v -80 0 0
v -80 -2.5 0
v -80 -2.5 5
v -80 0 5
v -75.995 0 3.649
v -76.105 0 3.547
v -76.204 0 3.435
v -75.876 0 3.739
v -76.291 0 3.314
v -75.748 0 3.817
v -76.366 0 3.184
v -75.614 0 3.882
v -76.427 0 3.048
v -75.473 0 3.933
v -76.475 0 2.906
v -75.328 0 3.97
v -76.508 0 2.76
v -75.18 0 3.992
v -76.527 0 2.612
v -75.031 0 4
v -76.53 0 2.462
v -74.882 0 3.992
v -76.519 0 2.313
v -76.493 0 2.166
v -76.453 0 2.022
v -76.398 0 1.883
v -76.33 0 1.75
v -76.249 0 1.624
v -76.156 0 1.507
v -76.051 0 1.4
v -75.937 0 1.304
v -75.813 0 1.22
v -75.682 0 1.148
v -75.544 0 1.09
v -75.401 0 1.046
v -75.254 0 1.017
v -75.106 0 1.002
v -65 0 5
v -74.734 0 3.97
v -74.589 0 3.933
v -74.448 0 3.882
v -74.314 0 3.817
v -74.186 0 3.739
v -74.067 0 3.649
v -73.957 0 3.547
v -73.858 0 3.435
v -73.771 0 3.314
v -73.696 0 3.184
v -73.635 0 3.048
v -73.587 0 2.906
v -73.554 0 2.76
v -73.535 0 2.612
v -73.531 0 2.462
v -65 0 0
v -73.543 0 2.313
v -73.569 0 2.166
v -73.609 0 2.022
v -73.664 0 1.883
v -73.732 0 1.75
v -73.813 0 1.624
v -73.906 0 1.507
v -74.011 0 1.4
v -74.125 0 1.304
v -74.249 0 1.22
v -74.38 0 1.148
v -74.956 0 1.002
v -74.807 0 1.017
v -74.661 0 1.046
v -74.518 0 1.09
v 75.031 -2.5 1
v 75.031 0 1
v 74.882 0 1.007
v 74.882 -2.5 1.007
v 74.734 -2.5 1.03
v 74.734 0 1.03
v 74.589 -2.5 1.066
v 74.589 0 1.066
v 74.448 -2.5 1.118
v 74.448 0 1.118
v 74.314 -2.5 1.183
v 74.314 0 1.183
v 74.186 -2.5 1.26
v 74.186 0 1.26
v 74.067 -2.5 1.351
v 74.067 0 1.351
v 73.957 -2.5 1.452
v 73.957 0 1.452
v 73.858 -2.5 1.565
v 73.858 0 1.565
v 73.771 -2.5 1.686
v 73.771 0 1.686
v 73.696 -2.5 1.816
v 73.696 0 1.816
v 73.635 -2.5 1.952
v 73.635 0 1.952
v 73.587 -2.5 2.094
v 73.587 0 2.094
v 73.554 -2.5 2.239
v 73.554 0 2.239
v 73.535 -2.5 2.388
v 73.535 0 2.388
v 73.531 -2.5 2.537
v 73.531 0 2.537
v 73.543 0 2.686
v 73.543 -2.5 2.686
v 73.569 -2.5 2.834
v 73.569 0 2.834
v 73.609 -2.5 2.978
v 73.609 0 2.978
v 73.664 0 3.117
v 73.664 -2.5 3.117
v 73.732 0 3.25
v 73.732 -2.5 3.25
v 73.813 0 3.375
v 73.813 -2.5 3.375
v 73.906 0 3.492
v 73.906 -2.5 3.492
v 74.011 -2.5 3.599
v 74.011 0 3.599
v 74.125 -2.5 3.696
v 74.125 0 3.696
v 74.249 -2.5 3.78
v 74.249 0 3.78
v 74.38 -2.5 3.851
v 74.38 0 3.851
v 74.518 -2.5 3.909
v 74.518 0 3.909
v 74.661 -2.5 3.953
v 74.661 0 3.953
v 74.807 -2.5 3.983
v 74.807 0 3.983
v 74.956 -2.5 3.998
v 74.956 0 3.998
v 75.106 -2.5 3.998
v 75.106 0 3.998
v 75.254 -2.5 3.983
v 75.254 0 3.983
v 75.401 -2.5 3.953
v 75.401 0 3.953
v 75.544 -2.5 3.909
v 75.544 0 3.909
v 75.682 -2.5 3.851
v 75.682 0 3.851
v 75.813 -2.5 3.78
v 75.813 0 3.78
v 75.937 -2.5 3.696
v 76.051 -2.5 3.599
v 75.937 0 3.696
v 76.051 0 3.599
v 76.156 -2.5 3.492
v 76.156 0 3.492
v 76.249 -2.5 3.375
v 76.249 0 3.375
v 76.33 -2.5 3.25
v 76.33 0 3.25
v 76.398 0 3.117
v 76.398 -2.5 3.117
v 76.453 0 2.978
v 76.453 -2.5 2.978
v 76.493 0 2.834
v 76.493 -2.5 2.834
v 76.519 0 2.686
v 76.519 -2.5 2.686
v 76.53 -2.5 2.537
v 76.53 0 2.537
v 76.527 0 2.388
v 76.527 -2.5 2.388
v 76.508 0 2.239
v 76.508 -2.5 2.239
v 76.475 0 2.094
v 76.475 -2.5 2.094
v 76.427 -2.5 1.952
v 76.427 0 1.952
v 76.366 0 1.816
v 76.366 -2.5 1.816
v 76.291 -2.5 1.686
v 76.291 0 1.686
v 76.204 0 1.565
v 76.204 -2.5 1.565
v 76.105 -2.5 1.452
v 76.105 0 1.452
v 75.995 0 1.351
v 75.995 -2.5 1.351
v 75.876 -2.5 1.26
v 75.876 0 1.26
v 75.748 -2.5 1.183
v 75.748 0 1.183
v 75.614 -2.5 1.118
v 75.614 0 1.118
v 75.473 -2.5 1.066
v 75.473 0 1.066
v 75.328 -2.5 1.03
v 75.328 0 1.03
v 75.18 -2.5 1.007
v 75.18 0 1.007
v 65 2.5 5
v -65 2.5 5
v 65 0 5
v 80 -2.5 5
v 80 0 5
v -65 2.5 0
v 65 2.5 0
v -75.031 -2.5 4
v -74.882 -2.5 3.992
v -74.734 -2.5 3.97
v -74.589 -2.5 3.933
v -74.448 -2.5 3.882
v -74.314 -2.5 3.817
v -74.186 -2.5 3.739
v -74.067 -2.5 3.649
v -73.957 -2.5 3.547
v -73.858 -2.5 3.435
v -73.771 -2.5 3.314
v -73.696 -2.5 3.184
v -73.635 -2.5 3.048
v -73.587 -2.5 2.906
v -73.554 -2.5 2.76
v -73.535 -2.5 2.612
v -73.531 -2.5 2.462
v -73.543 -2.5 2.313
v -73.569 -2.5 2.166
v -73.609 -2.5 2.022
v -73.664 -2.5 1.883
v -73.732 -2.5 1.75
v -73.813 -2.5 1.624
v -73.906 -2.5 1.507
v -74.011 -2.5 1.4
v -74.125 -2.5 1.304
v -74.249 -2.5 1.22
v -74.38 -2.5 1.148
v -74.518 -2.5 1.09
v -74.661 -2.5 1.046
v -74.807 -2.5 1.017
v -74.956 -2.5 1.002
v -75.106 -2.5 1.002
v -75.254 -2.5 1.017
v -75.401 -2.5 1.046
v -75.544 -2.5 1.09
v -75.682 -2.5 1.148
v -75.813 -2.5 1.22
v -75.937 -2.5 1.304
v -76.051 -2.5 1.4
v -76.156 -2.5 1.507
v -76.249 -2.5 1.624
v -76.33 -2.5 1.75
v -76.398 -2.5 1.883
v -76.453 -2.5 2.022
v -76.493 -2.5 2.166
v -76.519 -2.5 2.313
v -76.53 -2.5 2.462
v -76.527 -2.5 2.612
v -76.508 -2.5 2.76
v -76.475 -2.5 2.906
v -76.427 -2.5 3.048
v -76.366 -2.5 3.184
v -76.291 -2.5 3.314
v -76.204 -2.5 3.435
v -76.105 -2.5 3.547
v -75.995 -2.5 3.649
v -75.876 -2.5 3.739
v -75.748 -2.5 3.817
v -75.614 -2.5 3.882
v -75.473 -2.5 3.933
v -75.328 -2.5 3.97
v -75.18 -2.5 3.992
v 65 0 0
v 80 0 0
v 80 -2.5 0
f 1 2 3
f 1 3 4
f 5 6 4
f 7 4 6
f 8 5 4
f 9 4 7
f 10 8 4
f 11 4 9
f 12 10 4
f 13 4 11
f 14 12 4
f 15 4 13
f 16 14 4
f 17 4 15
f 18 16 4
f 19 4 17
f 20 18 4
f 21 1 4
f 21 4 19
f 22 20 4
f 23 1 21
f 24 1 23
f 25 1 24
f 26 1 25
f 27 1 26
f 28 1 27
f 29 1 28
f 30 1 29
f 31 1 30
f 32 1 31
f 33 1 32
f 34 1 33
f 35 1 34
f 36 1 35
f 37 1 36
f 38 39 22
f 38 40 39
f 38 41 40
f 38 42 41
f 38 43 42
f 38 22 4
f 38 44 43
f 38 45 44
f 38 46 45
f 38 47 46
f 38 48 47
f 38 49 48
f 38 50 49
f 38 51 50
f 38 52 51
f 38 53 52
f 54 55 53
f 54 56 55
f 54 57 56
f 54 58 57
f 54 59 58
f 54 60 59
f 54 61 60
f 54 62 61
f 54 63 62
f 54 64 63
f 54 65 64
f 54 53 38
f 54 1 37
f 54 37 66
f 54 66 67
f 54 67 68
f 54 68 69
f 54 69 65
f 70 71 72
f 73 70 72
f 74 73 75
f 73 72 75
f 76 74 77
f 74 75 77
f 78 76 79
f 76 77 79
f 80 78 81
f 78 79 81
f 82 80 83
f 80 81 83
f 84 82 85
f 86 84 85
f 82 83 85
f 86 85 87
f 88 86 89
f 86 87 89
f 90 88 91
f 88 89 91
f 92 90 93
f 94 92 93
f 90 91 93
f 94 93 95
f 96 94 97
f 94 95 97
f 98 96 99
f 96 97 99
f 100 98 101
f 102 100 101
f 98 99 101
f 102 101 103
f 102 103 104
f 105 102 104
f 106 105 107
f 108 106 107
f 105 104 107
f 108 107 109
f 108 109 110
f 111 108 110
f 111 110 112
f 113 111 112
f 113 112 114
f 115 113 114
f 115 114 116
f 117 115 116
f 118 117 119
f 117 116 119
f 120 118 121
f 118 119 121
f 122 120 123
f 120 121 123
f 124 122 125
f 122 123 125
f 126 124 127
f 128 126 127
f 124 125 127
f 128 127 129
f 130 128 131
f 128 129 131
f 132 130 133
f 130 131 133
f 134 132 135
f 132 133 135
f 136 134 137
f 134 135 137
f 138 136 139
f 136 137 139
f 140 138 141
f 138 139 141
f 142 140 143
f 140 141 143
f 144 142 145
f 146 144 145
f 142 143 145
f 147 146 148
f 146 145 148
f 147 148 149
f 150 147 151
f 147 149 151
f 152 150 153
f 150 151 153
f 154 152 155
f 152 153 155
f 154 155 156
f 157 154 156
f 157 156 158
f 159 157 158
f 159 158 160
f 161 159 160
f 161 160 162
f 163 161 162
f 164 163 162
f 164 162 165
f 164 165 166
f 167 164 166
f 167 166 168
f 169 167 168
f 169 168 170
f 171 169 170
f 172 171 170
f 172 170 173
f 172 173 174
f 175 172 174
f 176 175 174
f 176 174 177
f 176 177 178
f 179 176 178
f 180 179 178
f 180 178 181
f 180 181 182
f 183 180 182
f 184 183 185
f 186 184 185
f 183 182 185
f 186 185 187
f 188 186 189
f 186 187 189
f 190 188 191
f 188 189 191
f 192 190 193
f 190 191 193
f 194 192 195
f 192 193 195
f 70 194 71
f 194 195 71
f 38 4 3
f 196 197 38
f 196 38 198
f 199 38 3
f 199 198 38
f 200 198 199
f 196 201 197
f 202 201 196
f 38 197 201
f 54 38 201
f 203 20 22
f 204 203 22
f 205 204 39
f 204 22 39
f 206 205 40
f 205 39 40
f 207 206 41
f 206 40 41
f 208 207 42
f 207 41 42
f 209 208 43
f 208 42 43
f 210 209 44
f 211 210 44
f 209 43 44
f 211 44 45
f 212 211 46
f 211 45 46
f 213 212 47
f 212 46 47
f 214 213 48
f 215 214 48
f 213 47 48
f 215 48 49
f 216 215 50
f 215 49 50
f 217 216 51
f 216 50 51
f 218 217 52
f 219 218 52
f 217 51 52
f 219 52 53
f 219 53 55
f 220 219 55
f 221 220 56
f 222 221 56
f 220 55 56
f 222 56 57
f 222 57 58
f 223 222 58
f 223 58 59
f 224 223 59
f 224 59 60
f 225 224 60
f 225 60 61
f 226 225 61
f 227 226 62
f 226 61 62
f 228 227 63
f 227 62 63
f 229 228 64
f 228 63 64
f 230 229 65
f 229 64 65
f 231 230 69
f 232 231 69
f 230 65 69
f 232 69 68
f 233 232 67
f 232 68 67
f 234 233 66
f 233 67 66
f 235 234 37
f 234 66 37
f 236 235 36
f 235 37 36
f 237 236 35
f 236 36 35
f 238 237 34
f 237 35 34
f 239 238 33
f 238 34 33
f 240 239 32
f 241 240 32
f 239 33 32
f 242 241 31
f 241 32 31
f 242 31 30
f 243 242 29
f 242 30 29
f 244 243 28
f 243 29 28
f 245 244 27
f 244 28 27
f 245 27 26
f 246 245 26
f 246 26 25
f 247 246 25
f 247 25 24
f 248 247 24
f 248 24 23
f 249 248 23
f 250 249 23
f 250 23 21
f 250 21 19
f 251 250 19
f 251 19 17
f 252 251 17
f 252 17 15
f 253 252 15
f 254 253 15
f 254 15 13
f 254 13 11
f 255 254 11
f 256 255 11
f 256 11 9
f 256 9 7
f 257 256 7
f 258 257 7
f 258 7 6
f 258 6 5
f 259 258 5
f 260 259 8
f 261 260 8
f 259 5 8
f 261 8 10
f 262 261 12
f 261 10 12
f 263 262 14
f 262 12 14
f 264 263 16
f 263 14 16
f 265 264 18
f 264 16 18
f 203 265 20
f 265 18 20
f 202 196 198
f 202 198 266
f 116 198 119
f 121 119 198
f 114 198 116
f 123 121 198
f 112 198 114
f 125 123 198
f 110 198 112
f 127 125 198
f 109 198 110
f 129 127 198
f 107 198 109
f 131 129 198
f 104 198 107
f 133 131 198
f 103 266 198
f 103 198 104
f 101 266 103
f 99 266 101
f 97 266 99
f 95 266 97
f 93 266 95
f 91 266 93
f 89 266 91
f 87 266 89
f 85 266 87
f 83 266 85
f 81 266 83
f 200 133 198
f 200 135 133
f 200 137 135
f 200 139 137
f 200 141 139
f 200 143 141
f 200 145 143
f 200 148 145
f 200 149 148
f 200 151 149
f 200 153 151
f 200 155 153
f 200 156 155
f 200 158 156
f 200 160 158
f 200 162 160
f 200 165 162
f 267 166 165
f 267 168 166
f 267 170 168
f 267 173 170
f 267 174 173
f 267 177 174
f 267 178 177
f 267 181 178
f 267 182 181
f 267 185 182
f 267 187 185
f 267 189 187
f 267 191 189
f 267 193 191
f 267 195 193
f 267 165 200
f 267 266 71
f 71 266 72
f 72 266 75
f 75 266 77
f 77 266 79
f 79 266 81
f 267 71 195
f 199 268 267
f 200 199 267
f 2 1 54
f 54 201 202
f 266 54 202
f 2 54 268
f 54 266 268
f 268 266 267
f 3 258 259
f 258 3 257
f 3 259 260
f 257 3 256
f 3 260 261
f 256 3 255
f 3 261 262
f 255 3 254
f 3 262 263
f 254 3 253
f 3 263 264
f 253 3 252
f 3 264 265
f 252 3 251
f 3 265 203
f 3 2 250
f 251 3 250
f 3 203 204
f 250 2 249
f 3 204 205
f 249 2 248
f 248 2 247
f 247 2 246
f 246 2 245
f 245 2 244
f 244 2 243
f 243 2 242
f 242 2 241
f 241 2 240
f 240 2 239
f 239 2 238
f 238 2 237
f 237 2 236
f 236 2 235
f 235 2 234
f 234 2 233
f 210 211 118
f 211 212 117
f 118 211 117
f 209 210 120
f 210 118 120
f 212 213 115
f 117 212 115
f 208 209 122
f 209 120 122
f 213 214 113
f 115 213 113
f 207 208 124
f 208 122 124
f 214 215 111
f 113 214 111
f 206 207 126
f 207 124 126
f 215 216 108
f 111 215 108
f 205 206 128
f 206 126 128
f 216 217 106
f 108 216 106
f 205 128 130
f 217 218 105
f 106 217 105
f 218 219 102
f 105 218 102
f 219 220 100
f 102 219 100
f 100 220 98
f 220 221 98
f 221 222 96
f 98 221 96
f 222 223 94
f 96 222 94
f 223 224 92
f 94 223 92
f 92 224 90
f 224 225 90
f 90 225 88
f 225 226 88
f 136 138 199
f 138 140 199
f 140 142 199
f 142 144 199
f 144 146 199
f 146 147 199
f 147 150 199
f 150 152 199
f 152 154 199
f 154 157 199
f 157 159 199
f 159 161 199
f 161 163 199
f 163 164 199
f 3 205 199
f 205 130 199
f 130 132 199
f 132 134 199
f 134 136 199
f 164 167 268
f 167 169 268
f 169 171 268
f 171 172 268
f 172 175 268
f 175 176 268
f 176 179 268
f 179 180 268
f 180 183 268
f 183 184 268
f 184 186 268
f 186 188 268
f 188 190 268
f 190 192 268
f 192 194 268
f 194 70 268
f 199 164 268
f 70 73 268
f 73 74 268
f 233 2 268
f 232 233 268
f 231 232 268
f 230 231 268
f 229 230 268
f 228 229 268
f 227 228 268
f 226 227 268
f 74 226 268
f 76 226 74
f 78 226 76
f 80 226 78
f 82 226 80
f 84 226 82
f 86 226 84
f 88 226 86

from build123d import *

# Parameters (mm, degrees)
SKETCH1_W           = 160
SKETCH1_H           = 5
BOSS_EXTRUDE1_DEPTH = 5
SKETCH2_W           = 15
SKETCH2_H           = 5
CUT_EXTRUDE1_DEPTH  = 2.5
SKETCH3_R           = 1.5
CUT_EXTRUDE2_DEPTH  = 2.5


with BuildPart() as part:
    # Sketch1 → Boss-Extrude1 (new body)
    with BuildSketch(Plane.XY):
        Rectangle(SKETCH1_W, SKETCH1_H)
    extrude(amount=BOSS_EXTRUDE1_DEPTH)

    # Sketch2 → Cut-Extrude1 (cut)
    with BuildSketch(Plane(origin=(0, 2.5, 0), x_dir=(1, 0, 0), z_dir=(0, 1, 0))):
        with Locations((-72.5, -2.5)):
            Rectangle(SKETCH2_W, SKETCH2_H)
        with Locations((72.5, -2.5)):
            Rectangle(SKETCH2_W, SKETCH2_H)
    extrude(amount=-CUT_EXTRUDE1_DEPTH, mode=Mode.SUBTRACT)

    # Sketch3 → Cut-Extrude2 (cut)
    with BuildSketch(Plane(origin=(0, 0, 0), x_dir=(1, 0, 0), z_dir=(0, 1, 0))):
        with Locations(Location((-75.030916446, -2.499854379, 0), (0, 0, 270))):
            Circle(SKETCH3_R)
        with Locations(Location((75.030916446, -2.499854379, 0), (0, 0, 90))):
            Circle(SKETCH3_R)
    extrude(amount=-CUT_EXTRUDE2_DEPTH, mode=Mode.SUBTRACT)


solid = part.part
